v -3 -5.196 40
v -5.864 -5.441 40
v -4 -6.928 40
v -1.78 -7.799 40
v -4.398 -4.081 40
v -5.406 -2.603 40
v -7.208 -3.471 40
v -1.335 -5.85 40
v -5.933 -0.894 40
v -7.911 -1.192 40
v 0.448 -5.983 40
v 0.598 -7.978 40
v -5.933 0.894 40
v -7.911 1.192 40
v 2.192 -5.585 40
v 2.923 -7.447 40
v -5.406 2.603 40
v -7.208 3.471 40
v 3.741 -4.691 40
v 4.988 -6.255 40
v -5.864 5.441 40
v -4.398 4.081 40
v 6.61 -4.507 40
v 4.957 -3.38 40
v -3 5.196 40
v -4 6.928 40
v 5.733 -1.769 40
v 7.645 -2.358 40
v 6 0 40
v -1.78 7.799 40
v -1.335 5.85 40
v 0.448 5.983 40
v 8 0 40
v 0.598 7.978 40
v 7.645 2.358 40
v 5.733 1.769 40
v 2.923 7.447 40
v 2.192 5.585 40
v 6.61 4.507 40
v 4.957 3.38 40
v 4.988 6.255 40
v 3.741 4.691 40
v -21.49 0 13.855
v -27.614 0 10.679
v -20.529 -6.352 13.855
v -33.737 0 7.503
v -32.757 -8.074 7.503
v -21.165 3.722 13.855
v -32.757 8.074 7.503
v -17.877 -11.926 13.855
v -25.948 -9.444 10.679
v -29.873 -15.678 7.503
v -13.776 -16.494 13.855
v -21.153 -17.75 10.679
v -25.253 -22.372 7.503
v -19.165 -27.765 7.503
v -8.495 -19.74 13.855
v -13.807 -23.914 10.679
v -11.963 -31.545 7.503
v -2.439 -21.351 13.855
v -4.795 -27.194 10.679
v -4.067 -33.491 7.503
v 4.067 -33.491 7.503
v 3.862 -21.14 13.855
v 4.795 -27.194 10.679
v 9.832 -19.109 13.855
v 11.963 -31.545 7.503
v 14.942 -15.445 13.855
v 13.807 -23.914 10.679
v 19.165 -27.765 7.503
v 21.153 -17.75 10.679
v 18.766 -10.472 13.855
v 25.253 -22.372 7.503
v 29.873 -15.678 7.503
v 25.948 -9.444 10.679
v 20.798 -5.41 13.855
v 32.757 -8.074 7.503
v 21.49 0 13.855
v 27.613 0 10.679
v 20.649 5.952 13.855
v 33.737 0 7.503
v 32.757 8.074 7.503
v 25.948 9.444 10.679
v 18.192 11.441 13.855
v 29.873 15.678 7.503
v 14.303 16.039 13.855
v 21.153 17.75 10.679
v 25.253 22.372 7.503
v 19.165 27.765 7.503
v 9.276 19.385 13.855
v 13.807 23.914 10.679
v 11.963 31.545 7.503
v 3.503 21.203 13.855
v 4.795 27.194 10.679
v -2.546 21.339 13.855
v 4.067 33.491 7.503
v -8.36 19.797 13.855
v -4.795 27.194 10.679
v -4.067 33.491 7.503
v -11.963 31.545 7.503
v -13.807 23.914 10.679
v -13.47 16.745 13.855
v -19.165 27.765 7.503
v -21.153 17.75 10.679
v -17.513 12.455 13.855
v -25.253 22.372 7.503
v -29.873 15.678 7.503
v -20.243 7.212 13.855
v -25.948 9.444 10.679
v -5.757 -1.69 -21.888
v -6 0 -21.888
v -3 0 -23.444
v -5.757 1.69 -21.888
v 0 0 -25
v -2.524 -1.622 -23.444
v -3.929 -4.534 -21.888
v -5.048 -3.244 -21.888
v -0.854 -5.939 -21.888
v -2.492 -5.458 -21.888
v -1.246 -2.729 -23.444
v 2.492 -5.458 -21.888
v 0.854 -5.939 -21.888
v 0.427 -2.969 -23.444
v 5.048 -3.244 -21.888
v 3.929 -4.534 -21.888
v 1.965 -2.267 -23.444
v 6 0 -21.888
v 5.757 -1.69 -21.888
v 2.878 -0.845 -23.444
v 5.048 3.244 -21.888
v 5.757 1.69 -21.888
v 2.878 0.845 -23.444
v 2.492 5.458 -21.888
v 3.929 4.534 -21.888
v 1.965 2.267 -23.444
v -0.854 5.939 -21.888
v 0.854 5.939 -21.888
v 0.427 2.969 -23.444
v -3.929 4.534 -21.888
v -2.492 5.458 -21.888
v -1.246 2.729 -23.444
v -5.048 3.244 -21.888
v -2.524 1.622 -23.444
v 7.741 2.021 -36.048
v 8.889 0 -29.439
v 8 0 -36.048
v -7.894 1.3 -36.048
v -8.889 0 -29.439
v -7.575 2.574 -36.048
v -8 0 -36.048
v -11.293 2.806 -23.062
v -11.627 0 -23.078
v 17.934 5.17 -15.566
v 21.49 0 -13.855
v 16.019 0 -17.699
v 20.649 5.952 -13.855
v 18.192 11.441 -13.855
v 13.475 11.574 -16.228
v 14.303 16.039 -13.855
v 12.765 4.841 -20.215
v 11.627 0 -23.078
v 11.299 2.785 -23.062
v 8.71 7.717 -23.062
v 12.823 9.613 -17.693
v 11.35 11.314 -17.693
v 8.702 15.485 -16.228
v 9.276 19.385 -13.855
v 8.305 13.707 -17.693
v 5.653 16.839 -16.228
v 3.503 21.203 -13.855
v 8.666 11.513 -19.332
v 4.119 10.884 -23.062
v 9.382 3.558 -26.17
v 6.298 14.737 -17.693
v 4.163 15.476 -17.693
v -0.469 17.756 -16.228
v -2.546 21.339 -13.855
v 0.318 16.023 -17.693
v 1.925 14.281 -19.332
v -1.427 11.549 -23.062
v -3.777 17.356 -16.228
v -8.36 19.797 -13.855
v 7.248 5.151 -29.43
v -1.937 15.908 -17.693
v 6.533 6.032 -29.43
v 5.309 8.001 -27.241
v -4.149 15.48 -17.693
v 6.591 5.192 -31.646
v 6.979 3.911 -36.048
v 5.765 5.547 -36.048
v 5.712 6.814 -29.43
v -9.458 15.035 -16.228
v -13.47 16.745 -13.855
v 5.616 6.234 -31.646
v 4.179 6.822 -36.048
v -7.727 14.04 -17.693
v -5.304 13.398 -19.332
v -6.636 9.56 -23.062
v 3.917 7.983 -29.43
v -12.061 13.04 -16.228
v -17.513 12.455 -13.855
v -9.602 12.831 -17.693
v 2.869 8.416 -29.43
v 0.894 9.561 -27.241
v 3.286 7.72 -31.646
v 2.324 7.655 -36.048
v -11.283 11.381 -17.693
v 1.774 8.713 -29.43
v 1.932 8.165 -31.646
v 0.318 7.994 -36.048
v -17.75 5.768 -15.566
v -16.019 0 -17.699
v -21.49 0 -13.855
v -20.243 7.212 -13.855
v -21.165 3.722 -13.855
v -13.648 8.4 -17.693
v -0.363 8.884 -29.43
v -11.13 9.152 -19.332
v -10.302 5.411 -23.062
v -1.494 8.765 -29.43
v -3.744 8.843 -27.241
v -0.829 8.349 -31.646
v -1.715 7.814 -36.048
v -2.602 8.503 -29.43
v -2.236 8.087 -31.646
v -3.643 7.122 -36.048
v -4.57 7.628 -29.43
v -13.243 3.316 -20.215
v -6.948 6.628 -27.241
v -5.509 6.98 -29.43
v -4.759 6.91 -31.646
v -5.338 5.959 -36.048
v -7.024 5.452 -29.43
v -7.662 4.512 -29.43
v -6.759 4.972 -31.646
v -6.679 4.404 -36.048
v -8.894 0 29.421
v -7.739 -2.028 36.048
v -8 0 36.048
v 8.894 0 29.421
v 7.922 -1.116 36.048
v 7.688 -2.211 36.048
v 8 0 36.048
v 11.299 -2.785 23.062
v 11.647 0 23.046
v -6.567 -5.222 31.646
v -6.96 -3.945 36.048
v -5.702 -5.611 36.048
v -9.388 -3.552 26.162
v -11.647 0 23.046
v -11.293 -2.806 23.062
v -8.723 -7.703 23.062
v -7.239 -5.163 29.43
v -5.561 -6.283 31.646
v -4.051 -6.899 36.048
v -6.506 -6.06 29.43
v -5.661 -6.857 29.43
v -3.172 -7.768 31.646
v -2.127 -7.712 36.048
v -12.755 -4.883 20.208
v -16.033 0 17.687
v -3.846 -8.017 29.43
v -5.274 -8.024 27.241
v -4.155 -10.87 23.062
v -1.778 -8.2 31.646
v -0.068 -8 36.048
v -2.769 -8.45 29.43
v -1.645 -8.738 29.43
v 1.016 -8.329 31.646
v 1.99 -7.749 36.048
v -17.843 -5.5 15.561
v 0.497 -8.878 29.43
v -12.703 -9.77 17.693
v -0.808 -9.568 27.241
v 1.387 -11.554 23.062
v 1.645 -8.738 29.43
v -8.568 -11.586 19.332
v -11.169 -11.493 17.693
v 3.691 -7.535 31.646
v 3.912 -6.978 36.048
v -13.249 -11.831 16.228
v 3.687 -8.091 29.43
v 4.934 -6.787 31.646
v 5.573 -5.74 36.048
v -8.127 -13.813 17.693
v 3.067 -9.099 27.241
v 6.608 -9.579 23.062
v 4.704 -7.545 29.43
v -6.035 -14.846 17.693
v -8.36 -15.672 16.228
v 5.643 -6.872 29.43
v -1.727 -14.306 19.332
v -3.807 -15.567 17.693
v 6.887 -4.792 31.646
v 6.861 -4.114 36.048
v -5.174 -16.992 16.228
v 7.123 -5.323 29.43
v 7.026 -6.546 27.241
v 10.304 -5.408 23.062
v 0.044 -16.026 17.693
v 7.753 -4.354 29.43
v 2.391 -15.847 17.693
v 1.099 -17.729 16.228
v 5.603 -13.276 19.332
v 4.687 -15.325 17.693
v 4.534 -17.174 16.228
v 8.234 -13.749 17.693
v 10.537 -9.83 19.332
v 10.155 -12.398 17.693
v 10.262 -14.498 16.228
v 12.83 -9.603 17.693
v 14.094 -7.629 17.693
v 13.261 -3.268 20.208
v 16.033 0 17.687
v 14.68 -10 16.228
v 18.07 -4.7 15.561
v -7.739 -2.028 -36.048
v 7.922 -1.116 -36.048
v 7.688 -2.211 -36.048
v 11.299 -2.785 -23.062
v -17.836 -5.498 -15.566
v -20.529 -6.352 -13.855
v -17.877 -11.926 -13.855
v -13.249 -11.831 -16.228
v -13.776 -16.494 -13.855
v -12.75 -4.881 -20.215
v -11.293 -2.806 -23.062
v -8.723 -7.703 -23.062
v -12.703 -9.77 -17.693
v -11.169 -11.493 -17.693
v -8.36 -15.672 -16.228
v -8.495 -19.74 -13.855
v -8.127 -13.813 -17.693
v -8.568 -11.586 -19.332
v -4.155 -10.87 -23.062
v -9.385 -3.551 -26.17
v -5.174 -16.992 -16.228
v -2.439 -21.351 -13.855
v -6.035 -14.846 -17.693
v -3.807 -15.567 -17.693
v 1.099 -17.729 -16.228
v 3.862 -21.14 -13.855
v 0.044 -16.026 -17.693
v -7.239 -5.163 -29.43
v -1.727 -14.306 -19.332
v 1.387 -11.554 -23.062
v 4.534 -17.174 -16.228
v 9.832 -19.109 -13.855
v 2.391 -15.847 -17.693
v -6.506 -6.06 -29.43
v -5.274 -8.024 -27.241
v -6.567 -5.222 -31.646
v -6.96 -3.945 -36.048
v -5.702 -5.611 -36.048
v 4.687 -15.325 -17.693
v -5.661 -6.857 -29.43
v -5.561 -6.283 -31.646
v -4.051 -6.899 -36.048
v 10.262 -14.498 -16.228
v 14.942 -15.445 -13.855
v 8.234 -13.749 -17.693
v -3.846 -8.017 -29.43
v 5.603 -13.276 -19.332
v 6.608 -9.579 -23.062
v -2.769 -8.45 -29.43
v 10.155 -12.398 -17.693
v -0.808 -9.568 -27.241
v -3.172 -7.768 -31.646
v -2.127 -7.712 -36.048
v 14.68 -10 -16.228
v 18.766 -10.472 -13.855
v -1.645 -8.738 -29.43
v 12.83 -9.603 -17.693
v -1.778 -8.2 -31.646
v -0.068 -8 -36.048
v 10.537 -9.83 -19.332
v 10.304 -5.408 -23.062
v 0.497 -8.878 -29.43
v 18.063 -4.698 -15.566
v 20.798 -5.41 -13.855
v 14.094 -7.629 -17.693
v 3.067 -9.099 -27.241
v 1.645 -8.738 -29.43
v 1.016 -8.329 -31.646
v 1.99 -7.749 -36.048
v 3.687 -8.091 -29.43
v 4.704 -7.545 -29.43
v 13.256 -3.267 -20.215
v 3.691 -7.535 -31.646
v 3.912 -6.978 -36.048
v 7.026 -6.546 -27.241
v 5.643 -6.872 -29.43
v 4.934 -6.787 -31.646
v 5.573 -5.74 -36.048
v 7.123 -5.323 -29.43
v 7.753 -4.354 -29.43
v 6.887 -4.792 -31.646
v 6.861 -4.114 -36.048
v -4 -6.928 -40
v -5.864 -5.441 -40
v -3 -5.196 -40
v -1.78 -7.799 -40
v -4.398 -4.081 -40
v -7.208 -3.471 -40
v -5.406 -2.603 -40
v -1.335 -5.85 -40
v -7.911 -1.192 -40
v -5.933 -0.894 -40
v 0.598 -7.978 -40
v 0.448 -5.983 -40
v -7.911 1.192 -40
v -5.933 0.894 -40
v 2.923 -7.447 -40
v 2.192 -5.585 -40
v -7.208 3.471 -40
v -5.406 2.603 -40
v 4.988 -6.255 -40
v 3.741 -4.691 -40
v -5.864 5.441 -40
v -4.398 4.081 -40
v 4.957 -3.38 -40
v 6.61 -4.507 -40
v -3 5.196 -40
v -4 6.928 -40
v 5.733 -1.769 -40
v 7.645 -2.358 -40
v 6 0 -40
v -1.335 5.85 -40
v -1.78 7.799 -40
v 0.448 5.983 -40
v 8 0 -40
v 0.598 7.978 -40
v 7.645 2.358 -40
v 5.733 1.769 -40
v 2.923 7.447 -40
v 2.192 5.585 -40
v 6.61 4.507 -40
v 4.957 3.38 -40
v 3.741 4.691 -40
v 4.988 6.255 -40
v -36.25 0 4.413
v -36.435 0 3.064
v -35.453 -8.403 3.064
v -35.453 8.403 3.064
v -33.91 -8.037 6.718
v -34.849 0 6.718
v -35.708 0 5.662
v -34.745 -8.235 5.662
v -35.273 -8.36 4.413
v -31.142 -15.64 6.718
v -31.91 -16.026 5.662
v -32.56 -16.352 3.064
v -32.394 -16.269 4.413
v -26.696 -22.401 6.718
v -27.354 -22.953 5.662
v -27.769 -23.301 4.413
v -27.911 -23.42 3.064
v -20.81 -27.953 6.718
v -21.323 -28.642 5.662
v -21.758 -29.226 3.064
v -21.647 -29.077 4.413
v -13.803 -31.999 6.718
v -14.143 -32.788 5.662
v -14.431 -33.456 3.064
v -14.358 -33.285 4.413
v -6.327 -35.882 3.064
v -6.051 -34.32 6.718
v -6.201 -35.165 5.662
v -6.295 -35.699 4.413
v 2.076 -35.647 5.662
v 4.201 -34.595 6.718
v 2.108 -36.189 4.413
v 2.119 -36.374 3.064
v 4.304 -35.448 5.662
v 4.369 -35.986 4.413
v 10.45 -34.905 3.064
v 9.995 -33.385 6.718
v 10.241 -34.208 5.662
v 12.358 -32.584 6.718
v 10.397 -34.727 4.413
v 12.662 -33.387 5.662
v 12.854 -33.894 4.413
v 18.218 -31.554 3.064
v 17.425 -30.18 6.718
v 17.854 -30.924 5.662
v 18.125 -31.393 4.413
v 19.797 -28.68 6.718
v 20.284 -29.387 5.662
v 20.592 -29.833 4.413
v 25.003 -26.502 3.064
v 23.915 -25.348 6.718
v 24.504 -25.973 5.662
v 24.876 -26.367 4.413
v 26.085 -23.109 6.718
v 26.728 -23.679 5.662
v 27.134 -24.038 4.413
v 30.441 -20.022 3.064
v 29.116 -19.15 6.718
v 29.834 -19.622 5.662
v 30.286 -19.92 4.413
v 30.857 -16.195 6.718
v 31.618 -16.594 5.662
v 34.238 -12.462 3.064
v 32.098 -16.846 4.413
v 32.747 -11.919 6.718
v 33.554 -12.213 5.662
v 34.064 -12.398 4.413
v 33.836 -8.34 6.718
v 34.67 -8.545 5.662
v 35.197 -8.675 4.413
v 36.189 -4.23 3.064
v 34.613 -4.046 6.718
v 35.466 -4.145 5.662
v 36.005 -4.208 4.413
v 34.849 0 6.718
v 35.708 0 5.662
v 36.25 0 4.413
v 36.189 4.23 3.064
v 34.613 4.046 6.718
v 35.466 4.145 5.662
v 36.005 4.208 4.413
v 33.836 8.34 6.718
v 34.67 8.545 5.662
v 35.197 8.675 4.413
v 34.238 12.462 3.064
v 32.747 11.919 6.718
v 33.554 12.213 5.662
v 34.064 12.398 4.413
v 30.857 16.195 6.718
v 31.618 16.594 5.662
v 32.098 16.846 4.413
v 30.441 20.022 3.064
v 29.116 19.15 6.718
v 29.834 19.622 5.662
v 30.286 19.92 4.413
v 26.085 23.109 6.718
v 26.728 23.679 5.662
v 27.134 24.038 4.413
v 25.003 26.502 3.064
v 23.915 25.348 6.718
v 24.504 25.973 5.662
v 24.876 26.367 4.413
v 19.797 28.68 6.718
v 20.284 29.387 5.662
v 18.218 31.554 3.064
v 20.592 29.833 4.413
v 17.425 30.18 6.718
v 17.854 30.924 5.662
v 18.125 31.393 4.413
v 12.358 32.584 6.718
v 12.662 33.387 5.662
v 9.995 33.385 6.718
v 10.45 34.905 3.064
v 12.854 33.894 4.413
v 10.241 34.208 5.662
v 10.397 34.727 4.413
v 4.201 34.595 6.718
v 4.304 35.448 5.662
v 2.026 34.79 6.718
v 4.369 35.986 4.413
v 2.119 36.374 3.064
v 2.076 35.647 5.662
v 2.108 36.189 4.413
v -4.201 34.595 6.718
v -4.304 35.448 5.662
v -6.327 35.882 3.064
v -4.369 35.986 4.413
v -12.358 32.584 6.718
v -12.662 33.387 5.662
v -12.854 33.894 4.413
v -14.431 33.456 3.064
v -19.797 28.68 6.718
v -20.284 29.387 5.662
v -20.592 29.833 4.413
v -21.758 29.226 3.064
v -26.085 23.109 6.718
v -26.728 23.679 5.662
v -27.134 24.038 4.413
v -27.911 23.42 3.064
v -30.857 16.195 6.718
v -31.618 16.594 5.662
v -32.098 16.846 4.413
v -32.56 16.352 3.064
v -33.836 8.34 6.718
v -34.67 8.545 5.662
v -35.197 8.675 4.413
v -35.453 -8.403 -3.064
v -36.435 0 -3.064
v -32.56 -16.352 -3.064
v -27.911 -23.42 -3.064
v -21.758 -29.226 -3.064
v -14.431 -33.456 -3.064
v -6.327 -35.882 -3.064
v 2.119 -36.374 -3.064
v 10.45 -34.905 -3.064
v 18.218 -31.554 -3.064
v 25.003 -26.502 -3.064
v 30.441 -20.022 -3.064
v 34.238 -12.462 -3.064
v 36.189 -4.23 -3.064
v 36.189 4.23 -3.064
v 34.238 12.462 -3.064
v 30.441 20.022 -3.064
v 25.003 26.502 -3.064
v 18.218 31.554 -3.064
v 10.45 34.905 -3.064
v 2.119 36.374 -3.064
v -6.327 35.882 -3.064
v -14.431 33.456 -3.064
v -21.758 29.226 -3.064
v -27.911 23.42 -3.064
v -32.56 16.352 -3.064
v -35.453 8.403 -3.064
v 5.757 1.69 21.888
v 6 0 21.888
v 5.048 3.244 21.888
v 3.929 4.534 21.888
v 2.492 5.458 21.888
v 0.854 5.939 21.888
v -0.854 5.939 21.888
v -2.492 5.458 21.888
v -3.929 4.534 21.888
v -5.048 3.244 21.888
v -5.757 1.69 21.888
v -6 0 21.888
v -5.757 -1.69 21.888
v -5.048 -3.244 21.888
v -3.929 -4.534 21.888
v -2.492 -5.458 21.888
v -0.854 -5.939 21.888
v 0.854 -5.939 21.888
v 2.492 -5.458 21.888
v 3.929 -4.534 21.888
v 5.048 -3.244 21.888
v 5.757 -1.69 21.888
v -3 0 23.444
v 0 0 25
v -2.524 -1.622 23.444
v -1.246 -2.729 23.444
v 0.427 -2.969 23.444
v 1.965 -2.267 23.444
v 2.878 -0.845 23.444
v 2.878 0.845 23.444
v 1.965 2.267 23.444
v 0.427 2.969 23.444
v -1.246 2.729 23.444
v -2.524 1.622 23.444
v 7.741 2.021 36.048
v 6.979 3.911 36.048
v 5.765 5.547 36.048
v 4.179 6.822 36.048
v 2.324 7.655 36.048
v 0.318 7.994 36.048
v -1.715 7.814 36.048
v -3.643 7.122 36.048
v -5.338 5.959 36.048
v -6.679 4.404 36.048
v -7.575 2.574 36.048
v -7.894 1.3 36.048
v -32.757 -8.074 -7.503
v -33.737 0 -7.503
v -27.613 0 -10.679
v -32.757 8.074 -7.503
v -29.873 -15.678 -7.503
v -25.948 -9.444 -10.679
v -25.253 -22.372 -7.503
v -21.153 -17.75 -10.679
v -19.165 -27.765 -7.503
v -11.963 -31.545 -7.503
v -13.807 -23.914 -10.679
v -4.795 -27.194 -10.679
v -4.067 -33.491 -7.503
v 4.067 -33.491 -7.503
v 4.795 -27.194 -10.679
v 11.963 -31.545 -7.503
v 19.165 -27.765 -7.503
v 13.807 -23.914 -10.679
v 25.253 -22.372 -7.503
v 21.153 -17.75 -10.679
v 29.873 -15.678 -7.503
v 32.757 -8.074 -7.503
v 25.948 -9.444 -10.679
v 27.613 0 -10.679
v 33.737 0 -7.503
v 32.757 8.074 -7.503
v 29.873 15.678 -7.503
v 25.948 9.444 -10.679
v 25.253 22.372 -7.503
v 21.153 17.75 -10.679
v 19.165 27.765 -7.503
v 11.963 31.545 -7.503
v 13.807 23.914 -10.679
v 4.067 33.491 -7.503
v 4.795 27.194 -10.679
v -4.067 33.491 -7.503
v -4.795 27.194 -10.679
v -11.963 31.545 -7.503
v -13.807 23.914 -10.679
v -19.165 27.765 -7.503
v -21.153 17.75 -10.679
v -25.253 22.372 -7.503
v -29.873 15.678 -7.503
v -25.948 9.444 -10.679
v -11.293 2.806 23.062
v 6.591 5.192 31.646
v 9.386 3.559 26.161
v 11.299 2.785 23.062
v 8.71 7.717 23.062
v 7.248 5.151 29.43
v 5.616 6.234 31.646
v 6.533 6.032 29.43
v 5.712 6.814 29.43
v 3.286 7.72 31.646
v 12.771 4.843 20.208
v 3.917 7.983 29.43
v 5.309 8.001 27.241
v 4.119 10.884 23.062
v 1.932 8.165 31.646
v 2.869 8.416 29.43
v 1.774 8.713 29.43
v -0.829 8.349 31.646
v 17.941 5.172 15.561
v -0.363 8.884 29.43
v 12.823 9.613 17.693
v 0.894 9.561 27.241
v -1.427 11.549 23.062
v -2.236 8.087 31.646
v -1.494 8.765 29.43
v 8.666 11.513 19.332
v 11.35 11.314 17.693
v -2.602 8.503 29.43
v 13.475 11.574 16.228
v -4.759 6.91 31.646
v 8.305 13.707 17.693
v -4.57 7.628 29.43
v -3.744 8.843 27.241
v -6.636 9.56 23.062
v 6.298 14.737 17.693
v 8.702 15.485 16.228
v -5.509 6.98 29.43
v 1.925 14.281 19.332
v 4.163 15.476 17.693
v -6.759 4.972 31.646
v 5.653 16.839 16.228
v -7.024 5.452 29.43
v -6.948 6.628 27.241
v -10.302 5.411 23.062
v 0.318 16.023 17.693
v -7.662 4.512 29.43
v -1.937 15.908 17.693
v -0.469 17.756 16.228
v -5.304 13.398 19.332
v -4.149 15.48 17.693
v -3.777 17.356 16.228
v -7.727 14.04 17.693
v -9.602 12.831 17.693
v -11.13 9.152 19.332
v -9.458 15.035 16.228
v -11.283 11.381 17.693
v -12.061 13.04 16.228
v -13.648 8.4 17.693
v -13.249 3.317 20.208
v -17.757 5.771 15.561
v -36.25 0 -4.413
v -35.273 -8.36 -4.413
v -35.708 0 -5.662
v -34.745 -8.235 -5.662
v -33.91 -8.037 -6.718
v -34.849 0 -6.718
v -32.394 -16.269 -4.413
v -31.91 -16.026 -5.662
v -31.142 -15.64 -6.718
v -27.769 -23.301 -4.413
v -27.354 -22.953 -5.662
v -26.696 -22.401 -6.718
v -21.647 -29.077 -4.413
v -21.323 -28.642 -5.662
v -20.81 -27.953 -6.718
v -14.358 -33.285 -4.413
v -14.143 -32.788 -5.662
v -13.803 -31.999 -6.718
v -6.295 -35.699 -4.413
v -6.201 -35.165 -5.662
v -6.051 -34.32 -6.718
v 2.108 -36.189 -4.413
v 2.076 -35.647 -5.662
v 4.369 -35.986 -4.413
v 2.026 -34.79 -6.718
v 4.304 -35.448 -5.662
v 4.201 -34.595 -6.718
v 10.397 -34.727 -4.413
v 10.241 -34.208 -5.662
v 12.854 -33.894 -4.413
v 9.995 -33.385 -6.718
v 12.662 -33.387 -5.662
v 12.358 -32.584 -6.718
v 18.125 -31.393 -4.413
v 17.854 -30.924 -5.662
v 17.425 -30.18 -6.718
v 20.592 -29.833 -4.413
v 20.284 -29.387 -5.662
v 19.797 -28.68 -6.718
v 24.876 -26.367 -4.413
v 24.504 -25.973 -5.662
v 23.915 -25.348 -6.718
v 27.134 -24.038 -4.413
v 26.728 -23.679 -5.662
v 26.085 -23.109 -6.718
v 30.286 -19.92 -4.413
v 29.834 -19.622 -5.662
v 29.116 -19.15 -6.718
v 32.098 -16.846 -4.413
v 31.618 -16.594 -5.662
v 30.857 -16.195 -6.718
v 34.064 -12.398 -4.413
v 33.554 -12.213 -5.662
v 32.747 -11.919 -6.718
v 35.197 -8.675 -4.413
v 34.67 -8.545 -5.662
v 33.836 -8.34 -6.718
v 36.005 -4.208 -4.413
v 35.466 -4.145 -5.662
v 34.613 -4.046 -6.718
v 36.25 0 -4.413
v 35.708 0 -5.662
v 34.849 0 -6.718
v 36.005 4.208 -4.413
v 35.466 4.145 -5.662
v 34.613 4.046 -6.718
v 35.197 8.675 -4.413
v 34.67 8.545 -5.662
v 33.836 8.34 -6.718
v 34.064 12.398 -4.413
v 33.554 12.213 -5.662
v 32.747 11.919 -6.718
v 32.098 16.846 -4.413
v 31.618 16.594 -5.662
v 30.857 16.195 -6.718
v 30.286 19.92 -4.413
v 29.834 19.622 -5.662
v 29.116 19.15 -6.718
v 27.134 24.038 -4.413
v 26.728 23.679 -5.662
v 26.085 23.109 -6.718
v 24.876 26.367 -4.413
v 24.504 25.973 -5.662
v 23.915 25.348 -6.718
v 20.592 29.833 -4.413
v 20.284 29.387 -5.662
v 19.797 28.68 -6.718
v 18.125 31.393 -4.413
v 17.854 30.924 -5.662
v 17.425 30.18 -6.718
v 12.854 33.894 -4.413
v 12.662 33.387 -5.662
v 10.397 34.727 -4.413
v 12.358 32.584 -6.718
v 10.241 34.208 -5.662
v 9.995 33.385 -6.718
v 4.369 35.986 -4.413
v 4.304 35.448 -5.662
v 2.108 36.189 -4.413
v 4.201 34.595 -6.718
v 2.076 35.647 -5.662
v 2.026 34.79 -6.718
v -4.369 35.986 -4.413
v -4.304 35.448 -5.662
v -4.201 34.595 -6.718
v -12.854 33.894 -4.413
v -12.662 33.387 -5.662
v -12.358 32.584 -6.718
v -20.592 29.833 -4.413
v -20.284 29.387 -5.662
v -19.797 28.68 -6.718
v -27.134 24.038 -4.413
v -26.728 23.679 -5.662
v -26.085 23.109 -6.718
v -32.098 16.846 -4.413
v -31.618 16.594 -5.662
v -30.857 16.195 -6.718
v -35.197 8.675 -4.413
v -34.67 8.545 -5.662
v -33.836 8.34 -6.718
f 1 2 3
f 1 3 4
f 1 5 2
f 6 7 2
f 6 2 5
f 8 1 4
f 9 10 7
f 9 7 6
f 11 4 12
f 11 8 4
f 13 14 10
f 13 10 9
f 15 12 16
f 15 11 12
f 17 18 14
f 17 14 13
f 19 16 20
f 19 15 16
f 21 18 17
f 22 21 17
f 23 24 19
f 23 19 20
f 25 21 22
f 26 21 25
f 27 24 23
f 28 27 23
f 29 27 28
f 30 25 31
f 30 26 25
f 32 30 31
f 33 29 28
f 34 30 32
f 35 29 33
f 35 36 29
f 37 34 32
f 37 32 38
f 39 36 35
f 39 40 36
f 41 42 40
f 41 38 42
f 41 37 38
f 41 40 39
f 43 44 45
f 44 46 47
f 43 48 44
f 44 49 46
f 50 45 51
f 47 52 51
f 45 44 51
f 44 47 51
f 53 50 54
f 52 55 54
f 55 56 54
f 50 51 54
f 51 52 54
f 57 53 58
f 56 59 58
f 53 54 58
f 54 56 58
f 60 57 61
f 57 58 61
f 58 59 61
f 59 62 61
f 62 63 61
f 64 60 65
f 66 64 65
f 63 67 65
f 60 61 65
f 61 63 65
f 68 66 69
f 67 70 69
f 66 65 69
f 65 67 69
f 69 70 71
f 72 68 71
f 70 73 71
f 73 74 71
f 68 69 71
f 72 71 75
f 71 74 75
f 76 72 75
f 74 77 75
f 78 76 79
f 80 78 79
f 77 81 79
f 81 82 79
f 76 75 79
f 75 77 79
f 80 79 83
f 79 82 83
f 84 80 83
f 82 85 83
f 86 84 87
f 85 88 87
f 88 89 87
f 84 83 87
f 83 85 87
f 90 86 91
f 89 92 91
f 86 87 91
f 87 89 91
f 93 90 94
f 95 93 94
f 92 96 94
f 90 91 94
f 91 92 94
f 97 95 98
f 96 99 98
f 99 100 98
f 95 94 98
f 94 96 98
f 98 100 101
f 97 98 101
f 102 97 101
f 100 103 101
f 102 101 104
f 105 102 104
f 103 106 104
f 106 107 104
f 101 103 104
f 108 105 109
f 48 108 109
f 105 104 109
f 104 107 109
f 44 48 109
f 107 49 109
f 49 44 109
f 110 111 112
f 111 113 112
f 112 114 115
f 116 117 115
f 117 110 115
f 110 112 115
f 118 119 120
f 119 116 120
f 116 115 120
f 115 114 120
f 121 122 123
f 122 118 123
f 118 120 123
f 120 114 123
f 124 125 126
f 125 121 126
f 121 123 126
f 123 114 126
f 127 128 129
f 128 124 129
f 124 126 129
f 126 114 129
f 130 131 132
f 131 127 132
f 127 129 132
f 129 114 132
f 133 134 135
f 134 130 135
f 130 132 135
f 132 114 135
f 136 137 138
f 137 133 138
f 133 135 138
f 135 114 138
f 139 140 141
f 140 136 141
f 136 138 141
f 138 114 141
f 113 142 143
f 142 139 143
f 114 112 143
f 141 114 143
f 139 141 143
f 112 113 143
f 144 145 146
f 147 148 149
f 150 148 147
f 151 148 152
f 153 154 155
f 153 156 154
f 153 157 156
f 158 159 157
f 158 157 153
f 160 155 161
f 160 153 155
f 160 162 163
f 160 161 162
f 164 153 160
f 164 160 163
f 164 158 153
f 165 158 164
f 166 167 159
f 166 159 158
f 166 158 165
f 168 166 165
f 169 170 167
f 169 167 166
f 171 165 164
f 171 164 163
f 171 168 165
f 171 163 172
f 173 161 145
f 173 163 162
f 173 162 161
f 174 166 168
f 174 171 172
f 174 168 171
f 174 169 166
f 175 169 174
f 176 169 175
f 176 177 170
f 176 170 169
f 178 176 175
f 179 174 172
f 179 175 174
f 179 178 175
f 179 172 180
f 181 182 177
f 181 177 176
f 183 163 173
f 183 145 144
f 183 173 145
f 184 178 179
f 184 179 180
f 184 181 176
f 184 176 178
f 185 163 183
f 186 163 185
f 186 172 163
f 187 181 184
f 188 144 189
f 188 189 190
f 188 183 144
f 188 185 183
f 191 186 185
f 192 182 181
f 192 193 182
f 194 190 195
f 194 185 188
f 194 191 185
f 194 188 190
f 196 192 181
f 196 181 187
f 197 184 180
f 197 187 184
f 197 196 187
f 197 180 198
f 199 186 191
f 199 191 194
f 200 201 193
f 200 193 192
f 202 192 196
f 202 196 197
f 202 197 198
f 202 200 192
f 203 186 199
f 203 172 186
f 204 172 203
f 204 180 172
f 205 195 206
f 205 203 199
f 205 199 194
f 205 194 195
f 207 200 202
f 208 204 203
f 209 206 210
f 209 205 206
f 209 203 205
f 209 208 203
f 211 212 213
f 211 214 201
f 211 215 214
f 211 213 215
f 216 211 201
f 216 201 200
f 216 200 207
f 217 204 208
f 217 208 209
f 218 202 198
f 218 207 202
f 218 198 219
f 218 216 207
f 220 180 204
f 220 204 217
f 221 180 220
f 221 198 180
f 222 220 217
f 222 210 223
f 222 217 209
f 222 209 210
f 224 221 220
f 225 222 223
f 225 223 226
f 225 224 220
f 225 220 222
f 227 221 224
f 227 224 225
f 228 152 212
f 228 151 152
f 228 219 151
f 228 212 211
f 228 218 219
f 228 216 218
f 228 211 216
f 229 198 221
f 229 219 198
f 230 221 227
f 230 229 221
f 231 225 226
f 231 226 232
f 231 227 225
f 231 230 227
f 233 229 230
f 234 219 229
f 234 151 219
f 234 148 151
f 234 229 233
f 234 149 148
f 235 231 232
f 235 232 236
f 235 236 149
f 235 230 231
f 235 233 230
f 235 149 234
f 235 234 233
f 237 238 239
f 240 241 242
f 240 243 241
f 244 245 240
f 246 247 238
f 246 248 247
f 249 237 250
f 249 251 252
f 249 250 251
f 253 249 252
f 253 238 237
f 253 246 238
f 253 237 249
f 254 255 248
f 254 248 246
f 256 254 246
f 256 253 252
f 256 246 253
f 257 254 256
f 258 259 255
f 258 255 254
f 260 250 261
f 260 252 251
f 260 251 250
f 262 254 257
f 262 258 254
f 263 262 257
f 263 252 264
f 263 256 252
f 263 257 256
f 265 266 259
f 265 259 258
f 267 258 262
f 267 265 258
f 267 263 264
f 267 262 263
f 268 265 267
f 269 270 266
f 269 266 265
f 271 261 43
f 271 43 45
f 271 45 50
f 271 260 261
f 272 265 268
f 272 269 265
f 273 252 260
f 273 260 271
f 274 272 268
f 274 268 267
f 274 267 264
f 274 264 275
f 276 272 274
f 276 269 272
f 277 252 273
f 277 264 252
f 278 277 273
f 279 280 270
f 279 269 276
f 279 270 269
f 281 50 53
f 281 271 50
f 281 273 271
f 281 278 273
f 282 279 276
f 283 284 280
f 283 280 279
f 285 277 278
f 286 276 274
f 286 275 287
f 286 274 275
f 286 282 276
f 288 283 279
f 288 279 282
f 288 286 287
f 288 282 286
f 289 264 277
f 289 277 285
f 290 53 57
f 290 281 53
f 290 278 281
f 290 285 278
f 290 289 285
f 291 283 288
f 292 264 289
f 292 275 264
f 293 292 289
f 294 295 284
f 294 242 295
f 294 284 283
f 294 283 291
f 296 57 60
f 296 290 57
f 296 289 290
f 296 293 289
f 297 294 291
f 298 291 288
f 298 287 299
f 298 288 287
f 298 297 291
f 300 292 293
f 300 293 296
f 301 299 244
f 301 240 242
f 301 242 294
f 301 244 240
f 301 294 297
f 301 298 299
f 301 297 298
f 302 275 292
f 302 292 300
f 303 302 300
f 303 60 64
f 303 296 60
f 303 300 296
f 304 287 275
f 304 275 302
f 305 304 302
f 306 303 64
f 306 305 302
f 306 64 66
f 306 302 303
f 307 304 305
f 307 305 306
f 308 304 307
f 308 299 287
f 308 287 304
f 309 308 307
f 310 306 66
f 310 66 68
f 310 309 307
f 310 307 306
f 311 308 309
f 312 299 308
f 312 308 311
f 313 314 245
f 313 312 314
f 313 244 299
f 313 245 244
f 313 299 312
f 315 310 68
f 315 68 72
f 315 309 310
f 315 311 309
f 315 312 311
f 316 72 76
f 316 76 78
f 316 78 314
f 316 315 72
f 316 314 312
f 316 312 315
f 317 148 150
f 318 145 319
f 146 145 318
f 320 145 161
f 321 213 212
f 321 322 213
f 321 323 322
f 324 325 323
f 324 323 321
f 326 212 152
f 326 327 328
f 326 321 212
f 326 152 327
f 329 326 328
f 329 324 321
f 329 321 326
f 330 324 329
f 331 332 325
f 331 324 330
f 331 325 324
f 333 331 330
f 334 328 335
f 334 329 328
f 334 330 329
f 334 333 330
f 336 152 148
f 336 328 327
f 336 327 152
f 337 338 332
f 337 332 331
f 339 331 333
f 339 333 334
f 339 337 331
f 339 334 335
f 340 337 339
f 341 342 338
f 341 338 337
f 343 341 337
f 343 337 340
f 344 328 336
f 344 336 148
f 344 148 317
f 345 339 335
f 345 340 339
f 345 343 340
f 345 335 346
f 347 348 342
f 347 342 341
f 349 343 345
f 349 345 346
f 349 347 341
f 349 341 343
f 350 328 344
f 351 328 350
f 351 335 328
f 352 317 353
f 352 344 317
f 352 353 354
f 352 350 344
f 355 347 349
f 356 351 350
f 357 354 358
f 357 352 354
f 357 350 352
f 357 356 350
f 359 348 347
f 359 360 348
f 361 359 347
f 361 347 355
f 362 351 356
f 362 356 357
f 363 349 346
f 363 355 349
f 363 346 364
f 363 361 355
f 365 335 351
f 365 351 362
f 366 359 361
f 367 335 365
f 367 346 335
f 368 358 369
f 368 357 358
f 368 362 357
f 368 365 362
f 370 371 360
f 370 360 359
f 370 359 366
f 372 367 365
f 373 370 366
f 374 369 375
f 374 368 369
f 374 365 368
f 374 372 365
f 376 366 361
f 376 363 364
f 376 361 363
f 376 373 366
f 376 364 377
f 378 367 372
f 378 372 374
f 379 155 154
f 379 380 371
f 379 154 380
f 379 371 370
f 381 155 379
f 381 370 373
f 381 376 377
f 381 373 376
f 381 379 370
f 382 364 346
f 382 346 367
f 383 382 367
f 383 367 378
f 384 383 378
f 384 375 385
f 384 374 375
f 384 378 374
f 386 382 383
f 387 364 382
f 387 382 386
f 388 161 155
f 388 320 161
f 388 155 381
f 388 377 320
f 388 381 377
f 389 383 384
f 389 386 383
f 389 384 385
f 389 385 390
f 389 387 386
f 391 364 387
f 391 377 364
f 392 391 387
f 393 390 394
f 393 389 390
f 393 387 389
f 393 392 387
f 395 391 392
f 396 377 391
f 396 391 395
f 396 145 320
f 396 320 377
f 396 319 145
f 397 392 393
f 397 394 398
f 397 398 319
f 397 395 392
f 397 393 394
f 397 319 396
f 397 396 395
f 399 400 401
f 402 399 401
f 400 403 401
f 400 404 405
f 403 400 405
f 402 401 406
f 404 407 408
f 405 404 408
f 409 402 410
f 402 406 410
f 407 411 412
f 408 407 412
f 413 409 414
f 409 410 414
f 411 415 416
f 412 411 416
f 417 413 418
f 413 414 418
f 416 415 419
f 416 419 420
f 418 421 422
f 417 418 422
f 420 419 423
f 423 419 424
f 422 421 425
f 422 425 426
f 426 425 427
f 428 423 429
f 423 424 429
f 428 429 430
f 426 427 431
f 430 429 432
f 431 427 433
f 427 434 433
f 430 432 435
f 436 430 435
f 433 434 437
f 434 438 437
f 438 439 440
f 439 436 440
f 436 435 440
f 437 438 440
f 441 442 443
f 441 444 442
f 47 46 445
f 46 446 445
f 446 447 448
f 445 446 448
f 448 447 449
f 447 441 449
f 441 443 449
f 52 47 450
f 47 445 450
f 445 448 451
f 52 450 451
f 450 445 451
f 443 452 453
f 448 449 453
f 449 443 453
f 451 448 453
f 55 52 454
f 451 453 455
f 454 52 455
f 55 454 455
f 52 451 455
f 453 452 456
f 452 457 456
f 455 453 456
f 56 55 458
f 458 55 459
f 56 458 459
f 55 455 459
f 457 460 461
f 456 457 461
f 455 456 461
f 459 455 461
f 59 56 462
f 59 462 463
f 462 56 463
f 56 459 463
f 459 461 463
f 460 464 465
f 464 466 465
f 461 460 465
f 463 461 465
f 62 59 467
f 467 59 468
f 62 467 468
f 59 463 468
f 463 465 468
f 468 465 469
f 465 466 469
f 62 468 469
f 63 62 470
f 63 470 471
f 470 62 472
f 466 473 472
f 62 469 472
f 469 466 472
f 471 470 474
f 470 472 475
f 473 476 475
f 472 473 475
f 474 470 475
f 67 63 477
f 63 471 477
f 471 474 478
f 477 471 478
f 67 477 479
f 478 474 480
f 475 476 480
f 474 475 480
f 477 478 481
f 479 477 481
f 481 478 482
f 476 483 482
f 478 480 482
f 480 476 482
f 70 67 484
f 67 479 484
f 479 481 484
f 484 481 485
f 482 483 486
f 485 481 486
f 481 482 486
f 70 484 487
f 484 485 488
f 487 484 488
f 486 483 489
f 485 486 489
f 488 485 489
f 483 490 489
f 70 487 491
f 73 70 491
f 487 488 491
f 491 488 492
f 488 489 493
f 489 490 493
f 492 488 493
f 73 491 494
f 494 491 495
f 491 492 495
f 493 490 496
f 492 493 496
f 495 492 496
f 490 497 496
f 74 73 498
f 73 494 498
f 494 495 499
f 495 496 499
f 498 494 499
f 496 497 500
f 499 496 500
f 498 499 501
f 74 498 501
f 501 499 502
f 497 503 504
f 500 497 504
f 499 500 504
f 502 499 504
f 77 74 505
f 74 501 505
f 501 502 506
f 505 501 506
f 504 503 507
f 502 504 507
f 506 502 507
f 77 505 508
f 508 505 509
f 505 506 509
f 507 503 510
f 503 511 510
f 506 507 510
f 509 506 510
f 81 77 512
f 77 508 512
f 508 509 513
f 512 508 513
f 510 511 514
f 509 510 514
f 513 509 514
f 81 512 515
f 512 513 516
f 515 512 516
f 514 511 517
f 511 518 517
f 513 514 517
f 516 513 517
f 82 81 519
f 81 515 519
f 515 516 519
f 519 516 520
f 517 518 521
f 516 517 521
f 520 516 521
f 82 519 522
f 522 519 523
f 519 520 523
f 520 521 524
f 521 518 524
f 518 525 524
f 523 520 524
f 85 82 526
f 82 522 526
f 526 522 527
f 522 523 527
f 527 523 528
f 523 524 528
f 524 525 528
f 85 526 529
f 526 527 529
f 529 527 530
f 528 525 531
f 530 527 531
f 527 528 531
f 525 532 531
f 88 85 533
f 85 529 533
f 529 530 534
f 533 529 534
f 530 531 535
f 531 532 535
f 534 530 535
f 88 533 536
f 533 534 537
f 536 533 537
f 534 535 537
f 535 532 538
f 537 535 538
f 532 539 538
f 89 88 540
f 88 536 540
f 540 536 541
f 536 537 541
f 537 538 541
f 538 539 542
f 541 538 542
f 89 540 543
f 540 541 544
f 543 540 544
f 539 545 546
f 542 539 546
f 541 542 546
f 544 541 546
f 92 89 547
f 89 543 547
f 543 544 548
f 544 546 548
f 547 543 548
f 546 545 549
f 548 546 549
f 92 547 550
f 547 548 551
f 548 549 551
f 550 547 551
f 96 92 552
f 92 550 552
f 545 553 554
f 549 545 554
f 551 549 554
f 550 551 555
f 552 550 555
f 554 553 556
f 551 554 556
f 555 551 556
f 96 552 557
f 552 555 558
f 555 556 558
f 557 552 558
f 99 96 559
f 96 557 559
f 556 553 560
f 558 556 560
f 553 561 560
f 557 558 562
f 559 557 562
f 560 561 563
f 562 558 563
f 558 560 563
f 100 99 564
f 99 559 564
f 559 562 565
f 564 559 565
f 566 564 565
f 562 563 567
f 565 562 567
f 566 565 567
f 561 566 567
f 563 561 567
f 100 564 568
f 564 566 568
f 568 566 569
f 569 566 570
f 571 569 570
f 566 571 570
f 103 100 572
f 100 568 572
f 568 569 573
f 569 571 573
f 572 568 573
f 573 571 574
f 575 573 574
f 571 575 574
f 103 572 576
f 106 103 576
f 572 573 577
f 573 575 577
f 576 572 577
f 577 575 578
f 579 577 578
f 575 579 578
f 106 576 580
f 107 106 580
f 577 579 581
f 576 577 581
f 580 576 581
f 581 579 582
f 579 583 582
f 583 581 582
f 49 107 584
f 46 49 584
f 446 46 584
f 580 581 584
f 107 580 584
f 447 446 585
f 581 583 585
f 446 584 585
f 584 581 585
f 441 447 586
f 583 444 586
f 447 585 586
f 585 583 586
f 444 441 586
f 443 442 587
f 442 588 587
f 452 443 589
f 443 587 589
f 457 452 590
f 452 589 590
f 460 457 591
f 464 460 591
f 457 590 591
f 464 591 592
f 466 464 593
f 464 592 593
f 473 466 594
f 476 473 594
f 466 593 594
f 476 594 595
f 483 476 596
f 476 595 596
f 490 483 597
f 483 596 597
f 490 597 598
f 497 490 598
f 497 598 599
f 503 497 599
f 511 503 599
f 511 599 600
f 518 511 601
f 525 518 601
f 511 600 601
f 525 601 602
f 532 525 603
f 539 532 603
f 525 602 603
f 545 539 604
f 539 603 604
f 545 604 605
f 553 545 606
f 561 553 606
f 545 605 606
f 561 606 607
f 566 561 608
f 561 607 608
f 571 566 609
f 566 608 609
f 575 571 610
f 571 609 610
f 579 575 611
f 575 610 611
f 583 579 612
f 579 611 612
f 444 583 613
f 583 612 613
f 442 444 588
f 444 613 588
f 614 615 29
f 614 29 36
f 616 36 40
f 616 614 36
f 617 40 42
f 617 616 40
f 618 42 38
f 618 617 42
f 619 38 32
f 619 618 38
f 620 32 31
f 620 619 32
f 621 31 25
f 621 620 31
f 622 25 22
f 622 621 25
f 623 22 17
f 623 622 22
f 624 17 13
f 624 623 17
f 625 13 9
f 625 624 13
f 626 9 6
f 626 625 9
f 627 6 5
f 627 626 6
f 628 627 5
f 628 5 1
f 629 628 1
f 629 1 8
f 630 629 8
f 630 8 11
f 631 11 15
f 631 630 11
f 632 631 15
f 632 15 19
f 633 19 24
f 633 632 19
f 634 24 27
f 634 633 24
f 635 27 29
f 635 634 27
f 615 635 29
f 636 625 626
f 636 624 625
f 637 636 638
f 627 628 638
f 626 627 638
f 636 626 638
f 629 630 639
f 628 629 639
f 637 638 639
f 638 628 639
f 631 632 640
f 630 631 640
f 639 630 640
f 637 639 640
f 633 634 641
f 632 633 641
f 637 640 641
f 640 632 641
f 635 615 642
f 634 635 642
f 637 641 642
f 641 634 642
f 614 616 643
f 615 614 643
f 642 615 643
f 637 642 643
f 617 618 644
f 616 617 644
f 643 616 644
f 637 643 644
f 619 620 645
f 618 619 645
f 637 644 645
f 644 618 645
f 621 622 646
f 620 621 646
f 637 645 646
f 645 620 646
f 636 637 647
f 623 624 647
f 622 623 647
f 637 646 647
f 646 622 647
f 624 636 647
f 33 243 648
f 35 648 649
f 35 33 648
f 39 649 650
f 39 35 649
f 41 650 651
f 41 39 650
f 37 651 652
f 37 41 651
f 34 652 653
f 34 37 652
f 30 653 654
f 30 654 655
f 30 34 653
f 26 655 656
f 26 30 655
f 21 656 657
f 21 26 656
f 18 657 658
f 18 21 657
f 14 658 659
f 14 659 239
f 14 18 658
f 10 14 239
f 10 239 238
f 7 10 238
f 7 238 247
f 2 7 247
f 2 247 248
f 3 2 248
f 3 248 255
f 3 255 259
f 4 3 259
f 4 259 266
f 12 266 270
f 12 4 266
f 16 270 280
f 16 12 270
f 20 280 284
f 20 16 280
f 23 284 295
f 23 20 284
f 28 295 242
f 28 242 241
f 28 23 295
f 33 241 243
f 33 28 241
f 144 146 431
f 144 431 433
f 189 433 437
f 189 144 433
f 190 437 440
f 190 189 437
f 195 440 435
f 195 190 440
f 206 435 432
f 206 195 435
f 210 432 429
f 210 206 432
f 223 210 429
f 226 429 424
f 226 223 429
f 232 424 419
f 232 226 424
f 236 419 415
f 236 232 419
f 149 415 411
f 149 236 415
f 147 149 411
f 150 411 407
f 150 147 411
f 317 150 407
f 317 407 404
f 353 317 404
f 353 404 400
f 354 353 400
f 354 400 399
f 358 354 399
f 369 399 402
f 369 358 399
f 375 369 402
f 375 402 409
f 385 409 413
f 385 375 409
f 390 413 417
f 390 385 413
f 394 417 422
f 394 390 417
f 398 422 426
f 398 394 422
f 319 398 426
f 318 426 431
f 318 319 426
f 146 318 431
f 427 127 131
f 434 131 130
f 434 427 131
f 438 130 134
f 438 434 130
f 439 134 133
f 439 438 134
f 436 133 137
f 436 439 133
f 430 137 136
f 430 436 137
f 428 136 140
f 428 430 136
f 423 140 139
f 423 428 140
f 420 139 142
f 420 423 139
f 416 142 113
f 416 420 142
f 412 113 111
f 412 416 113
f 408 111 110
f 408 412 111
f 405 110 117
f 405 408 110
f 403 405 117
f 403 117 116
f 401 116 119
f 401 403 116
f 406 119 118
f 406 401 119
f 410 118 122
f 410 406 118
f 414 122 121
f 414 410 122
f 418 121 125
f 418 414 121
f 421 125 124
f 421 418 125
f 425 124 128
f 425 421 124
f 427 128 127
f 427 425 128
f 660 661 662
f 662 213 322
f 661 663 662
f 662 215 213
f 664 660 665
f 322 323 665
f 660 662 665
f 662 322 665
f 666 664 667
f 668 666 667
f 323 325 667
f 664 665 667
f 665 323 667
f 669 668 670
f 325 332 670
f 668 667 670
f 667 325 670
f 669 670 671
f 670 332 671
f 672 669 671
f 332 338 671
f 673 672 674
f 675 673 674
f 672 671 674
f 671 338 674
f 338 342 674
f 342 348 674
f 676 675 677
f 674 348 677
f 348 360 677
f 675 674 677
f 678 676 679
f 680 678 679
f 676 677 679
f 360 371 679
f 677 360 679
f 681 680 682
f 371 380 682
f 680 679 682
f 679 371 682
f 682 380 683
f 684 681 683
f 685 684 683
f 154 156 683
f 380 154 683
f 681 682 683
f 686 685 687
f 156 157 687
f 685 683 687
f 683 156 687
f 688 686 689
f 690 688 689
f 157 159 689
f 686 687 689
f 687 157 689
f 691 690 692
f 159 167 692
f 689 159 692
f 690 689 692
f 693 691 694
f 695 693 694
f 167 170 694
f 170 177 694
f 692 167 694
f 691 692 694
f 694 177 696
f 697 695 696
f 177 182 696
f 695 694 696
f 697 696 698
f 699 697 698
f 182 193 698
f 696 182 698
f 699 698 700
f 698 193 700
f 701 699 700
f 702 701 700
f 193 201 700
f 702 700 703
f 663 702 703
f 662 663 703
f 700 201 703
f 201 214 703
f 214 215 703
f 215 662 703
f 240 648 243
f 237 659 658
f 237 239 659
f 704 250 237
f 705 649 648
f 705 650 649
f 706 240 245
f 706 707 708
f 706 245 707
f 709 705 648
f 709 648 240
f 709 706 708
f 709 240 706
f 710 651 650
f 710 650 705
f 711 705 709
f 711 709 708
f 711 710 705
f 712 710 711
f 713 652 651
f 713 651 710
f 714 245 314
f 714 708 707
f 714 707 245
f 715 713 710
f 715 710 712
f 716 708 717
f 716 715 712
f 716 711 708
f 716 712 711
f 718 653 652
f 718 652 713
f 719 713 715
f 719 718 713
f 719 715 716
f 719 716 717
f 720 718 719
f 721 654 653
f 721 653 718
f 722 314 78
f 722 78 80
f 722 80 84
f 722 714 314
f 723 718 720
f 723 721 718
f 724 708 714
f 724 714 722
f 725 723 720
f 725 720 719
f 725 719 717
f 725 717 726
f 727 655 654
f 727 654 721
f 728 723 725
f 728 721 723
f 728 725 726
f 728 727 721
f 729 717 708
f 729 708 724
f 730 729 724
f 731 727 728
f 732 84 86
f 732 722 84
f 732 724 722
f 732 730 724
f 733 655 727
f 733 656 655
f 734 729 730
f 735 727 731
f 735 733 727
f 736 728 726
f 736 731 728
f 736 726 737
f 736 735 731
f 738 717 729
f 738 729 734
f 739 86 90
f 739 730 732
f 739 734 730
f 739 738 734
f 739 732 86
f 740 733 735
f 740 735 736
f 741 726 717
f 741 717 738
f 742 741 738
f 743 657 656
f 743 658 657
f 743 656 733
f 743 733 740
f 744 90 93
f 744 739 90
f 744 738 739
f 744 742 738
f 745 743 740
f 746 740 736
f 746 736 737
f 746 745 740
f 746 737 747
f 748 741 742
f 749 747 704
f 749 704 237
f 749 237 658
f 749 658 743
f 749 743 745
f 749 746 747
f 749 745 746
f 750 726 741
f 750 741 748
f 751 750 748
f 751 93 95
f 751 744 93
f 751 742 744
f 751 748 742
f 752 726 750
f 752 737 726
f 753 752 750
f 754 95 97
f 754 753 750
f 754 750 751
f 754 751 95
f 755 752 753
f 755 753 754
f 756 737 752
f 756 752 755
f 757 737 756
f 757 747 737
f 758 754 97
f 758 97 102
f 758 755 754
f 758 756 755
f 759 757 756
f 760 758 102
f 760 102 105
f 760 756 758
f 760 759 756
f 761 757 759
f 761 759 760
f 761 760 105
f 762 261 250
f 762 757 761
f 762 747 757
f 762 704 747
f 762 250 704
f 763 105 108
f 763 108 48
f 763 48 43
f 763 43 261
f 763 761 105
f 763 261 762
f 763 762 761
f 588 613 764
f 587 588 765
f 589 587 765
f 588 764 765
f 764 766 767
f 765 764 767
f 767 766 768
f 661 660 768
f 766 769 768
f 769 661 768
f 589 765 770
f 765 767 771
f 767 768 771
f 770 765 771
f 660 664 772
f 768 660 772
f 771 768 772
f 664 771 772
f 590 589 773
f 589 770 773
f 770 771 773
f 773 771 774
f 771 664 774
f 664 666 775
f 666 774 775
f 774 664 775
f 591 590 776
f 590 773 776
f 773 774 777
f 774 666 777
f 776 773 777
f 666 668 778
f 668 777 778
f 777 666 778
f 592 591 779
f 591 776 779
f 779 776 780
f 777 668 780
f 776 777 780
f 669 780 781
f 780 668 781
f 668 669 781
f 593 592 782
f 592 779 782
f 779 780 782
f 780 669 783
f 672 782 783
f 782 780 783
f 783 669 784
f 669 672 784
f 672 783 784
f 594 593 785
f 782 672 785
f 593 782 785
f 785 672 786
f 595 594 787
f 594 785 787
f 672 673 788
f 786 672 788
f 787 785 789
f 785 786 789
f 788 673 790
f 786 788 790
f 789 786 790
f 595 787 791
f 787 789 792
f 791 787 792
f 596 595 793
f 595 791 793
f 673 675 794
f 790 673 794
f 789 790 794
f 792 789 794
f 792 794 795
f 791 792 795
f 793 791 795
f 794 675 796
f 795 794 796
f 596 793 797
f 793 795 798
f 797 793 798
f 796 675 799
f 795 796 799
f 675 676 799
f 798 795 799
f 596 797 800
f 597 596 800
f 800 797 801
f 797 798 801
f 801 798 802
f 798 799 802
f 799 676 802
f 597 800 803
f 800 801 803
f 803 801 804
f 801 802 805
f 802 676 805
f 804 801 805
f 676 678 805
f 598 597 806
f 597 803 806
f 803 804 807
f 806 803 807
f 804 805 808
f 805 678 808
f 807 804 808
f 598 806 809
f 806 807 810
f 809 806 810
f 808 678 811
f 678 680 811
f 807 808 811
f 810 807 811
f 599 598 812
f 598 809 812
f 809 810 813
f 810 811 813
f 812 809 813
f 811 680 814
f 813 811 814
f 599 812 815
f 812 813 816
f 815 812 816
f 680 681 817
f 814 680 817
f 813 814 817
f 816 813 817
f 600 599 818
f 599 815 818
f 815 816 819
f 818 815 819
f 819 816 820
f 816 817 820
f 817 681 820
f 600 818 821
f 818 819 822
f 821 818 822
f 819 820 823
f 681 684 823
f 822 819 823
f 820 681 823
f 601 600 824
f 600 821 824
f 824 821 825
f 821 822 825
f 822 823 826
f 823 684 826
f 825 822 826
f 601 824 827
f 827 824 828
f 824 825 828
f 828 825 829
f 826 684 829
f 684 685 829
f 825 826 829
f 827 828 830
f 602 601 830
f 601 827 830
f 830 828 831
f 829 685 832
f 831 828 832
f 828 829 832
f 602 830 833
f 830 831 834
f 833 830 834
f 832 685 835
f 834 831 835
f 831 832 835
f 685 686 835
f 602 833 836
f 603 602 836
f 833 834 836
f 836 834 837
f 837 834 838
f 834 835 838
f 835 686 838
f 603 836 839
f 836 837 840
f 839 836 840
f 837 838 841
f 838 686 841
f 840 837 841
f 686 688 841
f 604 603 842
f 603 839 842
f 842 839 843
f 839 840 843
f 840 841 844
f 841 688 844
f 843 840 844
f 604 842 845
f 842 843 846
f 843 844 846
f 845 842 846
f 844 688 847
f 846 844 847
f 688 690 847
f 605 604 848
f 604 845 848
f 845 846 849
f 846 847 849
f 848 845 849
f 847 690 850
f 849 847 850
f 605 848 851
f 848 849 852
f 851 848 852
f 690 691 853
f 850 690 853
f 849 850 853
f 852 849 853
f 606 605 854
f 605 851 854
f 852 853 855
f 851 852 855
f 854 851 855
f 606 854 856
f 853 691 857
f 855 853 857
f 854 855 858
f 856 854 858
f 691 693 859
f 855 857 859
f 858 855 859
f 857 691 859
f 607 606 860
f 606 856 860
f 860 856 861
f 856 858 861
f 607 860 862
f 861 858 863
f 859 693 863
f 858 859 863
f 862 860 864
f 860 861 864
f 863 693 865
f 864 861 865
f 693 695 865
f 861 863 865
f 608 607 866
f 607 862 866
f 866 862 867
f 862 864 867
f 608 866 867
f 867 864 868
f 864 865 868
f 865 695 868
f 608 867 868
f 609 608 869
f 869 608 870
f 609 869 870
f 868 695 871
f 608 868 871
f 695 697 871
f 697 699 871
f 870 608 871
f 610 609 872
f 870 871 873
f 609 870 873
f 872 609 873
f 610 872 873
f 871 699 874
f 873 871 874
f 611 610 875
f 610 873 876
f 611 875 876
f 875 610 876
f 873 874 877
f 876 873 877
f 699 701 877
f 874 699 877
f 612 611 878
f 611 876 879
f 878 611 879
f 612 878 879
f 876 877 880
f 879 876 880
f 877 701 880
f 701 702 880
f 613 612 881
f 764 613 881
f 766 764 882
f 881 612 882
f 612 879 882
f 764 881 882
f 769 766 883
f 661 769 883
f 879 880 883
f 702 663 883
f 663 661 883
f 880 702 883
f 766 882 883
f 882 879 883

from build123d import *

# Parameters (mm, degrees)
SKETCH1_R           = 8
SKETCH1_R_2         = 6
BOSS_EXTRUDE1_DEPTH = 40
FILLET1_R           = 25


with BuildPart() as part:
    # Sketch1 → Boss-Extrude1 (new, symmetric)
    with BuildSketch(Plane.XY):
        Circle(SKETCH1_R)
        Circle(SKETCH1_R_2, mode=Mode.SUBTRACT)
    extrude(amount=BOSS_EXTRUDE1_DEPTH, both=True)

    # Sketch2 → Revolve1 (revolve)
    with BuildSketch(Plane(origin=(0, 0, 0), x_dir=(0, 0, -1), z_dir=(1, 0, 0)), mode=Mode.PRIVATE) as revolve1_sk:
        with BuildLine():
            Line((-25, 0), (-7.502982863, 33.73728427))
            ThreePointArc((-7.502982863, 33.73728427), (-5.661537285, 35.707899486), (-3.064404332, 36.4353241))
            Line((-3.064404332, 36.4353241), (3.064404332, 36.4353241))
            ThreePointArc((3.064404332, 36.4353241), (5.661537285, 35.707899486), (7.502982863, 33.73728427))
            Line((7.502982863, 33.73728427), (25, 0))
            Line((25, 0), (-25, 0))
        make_face()
    revolve(revolve1_sk.sketch.rotate(Axis((0, 0, -25), (0, 0, 1)), 90), axis=Axis((0, 0, -25), (0, 0, 1)))

    # Fillet1
    fillet1_edges = [part.edges().sort_by_distance(p)[0] for p in [
        (0, 8, -20.850995712),
        (0, 8, 20.850995712),
    ]]
    fillet(fillet1_edges, radius=FILLET1_R)


solid = part.part
